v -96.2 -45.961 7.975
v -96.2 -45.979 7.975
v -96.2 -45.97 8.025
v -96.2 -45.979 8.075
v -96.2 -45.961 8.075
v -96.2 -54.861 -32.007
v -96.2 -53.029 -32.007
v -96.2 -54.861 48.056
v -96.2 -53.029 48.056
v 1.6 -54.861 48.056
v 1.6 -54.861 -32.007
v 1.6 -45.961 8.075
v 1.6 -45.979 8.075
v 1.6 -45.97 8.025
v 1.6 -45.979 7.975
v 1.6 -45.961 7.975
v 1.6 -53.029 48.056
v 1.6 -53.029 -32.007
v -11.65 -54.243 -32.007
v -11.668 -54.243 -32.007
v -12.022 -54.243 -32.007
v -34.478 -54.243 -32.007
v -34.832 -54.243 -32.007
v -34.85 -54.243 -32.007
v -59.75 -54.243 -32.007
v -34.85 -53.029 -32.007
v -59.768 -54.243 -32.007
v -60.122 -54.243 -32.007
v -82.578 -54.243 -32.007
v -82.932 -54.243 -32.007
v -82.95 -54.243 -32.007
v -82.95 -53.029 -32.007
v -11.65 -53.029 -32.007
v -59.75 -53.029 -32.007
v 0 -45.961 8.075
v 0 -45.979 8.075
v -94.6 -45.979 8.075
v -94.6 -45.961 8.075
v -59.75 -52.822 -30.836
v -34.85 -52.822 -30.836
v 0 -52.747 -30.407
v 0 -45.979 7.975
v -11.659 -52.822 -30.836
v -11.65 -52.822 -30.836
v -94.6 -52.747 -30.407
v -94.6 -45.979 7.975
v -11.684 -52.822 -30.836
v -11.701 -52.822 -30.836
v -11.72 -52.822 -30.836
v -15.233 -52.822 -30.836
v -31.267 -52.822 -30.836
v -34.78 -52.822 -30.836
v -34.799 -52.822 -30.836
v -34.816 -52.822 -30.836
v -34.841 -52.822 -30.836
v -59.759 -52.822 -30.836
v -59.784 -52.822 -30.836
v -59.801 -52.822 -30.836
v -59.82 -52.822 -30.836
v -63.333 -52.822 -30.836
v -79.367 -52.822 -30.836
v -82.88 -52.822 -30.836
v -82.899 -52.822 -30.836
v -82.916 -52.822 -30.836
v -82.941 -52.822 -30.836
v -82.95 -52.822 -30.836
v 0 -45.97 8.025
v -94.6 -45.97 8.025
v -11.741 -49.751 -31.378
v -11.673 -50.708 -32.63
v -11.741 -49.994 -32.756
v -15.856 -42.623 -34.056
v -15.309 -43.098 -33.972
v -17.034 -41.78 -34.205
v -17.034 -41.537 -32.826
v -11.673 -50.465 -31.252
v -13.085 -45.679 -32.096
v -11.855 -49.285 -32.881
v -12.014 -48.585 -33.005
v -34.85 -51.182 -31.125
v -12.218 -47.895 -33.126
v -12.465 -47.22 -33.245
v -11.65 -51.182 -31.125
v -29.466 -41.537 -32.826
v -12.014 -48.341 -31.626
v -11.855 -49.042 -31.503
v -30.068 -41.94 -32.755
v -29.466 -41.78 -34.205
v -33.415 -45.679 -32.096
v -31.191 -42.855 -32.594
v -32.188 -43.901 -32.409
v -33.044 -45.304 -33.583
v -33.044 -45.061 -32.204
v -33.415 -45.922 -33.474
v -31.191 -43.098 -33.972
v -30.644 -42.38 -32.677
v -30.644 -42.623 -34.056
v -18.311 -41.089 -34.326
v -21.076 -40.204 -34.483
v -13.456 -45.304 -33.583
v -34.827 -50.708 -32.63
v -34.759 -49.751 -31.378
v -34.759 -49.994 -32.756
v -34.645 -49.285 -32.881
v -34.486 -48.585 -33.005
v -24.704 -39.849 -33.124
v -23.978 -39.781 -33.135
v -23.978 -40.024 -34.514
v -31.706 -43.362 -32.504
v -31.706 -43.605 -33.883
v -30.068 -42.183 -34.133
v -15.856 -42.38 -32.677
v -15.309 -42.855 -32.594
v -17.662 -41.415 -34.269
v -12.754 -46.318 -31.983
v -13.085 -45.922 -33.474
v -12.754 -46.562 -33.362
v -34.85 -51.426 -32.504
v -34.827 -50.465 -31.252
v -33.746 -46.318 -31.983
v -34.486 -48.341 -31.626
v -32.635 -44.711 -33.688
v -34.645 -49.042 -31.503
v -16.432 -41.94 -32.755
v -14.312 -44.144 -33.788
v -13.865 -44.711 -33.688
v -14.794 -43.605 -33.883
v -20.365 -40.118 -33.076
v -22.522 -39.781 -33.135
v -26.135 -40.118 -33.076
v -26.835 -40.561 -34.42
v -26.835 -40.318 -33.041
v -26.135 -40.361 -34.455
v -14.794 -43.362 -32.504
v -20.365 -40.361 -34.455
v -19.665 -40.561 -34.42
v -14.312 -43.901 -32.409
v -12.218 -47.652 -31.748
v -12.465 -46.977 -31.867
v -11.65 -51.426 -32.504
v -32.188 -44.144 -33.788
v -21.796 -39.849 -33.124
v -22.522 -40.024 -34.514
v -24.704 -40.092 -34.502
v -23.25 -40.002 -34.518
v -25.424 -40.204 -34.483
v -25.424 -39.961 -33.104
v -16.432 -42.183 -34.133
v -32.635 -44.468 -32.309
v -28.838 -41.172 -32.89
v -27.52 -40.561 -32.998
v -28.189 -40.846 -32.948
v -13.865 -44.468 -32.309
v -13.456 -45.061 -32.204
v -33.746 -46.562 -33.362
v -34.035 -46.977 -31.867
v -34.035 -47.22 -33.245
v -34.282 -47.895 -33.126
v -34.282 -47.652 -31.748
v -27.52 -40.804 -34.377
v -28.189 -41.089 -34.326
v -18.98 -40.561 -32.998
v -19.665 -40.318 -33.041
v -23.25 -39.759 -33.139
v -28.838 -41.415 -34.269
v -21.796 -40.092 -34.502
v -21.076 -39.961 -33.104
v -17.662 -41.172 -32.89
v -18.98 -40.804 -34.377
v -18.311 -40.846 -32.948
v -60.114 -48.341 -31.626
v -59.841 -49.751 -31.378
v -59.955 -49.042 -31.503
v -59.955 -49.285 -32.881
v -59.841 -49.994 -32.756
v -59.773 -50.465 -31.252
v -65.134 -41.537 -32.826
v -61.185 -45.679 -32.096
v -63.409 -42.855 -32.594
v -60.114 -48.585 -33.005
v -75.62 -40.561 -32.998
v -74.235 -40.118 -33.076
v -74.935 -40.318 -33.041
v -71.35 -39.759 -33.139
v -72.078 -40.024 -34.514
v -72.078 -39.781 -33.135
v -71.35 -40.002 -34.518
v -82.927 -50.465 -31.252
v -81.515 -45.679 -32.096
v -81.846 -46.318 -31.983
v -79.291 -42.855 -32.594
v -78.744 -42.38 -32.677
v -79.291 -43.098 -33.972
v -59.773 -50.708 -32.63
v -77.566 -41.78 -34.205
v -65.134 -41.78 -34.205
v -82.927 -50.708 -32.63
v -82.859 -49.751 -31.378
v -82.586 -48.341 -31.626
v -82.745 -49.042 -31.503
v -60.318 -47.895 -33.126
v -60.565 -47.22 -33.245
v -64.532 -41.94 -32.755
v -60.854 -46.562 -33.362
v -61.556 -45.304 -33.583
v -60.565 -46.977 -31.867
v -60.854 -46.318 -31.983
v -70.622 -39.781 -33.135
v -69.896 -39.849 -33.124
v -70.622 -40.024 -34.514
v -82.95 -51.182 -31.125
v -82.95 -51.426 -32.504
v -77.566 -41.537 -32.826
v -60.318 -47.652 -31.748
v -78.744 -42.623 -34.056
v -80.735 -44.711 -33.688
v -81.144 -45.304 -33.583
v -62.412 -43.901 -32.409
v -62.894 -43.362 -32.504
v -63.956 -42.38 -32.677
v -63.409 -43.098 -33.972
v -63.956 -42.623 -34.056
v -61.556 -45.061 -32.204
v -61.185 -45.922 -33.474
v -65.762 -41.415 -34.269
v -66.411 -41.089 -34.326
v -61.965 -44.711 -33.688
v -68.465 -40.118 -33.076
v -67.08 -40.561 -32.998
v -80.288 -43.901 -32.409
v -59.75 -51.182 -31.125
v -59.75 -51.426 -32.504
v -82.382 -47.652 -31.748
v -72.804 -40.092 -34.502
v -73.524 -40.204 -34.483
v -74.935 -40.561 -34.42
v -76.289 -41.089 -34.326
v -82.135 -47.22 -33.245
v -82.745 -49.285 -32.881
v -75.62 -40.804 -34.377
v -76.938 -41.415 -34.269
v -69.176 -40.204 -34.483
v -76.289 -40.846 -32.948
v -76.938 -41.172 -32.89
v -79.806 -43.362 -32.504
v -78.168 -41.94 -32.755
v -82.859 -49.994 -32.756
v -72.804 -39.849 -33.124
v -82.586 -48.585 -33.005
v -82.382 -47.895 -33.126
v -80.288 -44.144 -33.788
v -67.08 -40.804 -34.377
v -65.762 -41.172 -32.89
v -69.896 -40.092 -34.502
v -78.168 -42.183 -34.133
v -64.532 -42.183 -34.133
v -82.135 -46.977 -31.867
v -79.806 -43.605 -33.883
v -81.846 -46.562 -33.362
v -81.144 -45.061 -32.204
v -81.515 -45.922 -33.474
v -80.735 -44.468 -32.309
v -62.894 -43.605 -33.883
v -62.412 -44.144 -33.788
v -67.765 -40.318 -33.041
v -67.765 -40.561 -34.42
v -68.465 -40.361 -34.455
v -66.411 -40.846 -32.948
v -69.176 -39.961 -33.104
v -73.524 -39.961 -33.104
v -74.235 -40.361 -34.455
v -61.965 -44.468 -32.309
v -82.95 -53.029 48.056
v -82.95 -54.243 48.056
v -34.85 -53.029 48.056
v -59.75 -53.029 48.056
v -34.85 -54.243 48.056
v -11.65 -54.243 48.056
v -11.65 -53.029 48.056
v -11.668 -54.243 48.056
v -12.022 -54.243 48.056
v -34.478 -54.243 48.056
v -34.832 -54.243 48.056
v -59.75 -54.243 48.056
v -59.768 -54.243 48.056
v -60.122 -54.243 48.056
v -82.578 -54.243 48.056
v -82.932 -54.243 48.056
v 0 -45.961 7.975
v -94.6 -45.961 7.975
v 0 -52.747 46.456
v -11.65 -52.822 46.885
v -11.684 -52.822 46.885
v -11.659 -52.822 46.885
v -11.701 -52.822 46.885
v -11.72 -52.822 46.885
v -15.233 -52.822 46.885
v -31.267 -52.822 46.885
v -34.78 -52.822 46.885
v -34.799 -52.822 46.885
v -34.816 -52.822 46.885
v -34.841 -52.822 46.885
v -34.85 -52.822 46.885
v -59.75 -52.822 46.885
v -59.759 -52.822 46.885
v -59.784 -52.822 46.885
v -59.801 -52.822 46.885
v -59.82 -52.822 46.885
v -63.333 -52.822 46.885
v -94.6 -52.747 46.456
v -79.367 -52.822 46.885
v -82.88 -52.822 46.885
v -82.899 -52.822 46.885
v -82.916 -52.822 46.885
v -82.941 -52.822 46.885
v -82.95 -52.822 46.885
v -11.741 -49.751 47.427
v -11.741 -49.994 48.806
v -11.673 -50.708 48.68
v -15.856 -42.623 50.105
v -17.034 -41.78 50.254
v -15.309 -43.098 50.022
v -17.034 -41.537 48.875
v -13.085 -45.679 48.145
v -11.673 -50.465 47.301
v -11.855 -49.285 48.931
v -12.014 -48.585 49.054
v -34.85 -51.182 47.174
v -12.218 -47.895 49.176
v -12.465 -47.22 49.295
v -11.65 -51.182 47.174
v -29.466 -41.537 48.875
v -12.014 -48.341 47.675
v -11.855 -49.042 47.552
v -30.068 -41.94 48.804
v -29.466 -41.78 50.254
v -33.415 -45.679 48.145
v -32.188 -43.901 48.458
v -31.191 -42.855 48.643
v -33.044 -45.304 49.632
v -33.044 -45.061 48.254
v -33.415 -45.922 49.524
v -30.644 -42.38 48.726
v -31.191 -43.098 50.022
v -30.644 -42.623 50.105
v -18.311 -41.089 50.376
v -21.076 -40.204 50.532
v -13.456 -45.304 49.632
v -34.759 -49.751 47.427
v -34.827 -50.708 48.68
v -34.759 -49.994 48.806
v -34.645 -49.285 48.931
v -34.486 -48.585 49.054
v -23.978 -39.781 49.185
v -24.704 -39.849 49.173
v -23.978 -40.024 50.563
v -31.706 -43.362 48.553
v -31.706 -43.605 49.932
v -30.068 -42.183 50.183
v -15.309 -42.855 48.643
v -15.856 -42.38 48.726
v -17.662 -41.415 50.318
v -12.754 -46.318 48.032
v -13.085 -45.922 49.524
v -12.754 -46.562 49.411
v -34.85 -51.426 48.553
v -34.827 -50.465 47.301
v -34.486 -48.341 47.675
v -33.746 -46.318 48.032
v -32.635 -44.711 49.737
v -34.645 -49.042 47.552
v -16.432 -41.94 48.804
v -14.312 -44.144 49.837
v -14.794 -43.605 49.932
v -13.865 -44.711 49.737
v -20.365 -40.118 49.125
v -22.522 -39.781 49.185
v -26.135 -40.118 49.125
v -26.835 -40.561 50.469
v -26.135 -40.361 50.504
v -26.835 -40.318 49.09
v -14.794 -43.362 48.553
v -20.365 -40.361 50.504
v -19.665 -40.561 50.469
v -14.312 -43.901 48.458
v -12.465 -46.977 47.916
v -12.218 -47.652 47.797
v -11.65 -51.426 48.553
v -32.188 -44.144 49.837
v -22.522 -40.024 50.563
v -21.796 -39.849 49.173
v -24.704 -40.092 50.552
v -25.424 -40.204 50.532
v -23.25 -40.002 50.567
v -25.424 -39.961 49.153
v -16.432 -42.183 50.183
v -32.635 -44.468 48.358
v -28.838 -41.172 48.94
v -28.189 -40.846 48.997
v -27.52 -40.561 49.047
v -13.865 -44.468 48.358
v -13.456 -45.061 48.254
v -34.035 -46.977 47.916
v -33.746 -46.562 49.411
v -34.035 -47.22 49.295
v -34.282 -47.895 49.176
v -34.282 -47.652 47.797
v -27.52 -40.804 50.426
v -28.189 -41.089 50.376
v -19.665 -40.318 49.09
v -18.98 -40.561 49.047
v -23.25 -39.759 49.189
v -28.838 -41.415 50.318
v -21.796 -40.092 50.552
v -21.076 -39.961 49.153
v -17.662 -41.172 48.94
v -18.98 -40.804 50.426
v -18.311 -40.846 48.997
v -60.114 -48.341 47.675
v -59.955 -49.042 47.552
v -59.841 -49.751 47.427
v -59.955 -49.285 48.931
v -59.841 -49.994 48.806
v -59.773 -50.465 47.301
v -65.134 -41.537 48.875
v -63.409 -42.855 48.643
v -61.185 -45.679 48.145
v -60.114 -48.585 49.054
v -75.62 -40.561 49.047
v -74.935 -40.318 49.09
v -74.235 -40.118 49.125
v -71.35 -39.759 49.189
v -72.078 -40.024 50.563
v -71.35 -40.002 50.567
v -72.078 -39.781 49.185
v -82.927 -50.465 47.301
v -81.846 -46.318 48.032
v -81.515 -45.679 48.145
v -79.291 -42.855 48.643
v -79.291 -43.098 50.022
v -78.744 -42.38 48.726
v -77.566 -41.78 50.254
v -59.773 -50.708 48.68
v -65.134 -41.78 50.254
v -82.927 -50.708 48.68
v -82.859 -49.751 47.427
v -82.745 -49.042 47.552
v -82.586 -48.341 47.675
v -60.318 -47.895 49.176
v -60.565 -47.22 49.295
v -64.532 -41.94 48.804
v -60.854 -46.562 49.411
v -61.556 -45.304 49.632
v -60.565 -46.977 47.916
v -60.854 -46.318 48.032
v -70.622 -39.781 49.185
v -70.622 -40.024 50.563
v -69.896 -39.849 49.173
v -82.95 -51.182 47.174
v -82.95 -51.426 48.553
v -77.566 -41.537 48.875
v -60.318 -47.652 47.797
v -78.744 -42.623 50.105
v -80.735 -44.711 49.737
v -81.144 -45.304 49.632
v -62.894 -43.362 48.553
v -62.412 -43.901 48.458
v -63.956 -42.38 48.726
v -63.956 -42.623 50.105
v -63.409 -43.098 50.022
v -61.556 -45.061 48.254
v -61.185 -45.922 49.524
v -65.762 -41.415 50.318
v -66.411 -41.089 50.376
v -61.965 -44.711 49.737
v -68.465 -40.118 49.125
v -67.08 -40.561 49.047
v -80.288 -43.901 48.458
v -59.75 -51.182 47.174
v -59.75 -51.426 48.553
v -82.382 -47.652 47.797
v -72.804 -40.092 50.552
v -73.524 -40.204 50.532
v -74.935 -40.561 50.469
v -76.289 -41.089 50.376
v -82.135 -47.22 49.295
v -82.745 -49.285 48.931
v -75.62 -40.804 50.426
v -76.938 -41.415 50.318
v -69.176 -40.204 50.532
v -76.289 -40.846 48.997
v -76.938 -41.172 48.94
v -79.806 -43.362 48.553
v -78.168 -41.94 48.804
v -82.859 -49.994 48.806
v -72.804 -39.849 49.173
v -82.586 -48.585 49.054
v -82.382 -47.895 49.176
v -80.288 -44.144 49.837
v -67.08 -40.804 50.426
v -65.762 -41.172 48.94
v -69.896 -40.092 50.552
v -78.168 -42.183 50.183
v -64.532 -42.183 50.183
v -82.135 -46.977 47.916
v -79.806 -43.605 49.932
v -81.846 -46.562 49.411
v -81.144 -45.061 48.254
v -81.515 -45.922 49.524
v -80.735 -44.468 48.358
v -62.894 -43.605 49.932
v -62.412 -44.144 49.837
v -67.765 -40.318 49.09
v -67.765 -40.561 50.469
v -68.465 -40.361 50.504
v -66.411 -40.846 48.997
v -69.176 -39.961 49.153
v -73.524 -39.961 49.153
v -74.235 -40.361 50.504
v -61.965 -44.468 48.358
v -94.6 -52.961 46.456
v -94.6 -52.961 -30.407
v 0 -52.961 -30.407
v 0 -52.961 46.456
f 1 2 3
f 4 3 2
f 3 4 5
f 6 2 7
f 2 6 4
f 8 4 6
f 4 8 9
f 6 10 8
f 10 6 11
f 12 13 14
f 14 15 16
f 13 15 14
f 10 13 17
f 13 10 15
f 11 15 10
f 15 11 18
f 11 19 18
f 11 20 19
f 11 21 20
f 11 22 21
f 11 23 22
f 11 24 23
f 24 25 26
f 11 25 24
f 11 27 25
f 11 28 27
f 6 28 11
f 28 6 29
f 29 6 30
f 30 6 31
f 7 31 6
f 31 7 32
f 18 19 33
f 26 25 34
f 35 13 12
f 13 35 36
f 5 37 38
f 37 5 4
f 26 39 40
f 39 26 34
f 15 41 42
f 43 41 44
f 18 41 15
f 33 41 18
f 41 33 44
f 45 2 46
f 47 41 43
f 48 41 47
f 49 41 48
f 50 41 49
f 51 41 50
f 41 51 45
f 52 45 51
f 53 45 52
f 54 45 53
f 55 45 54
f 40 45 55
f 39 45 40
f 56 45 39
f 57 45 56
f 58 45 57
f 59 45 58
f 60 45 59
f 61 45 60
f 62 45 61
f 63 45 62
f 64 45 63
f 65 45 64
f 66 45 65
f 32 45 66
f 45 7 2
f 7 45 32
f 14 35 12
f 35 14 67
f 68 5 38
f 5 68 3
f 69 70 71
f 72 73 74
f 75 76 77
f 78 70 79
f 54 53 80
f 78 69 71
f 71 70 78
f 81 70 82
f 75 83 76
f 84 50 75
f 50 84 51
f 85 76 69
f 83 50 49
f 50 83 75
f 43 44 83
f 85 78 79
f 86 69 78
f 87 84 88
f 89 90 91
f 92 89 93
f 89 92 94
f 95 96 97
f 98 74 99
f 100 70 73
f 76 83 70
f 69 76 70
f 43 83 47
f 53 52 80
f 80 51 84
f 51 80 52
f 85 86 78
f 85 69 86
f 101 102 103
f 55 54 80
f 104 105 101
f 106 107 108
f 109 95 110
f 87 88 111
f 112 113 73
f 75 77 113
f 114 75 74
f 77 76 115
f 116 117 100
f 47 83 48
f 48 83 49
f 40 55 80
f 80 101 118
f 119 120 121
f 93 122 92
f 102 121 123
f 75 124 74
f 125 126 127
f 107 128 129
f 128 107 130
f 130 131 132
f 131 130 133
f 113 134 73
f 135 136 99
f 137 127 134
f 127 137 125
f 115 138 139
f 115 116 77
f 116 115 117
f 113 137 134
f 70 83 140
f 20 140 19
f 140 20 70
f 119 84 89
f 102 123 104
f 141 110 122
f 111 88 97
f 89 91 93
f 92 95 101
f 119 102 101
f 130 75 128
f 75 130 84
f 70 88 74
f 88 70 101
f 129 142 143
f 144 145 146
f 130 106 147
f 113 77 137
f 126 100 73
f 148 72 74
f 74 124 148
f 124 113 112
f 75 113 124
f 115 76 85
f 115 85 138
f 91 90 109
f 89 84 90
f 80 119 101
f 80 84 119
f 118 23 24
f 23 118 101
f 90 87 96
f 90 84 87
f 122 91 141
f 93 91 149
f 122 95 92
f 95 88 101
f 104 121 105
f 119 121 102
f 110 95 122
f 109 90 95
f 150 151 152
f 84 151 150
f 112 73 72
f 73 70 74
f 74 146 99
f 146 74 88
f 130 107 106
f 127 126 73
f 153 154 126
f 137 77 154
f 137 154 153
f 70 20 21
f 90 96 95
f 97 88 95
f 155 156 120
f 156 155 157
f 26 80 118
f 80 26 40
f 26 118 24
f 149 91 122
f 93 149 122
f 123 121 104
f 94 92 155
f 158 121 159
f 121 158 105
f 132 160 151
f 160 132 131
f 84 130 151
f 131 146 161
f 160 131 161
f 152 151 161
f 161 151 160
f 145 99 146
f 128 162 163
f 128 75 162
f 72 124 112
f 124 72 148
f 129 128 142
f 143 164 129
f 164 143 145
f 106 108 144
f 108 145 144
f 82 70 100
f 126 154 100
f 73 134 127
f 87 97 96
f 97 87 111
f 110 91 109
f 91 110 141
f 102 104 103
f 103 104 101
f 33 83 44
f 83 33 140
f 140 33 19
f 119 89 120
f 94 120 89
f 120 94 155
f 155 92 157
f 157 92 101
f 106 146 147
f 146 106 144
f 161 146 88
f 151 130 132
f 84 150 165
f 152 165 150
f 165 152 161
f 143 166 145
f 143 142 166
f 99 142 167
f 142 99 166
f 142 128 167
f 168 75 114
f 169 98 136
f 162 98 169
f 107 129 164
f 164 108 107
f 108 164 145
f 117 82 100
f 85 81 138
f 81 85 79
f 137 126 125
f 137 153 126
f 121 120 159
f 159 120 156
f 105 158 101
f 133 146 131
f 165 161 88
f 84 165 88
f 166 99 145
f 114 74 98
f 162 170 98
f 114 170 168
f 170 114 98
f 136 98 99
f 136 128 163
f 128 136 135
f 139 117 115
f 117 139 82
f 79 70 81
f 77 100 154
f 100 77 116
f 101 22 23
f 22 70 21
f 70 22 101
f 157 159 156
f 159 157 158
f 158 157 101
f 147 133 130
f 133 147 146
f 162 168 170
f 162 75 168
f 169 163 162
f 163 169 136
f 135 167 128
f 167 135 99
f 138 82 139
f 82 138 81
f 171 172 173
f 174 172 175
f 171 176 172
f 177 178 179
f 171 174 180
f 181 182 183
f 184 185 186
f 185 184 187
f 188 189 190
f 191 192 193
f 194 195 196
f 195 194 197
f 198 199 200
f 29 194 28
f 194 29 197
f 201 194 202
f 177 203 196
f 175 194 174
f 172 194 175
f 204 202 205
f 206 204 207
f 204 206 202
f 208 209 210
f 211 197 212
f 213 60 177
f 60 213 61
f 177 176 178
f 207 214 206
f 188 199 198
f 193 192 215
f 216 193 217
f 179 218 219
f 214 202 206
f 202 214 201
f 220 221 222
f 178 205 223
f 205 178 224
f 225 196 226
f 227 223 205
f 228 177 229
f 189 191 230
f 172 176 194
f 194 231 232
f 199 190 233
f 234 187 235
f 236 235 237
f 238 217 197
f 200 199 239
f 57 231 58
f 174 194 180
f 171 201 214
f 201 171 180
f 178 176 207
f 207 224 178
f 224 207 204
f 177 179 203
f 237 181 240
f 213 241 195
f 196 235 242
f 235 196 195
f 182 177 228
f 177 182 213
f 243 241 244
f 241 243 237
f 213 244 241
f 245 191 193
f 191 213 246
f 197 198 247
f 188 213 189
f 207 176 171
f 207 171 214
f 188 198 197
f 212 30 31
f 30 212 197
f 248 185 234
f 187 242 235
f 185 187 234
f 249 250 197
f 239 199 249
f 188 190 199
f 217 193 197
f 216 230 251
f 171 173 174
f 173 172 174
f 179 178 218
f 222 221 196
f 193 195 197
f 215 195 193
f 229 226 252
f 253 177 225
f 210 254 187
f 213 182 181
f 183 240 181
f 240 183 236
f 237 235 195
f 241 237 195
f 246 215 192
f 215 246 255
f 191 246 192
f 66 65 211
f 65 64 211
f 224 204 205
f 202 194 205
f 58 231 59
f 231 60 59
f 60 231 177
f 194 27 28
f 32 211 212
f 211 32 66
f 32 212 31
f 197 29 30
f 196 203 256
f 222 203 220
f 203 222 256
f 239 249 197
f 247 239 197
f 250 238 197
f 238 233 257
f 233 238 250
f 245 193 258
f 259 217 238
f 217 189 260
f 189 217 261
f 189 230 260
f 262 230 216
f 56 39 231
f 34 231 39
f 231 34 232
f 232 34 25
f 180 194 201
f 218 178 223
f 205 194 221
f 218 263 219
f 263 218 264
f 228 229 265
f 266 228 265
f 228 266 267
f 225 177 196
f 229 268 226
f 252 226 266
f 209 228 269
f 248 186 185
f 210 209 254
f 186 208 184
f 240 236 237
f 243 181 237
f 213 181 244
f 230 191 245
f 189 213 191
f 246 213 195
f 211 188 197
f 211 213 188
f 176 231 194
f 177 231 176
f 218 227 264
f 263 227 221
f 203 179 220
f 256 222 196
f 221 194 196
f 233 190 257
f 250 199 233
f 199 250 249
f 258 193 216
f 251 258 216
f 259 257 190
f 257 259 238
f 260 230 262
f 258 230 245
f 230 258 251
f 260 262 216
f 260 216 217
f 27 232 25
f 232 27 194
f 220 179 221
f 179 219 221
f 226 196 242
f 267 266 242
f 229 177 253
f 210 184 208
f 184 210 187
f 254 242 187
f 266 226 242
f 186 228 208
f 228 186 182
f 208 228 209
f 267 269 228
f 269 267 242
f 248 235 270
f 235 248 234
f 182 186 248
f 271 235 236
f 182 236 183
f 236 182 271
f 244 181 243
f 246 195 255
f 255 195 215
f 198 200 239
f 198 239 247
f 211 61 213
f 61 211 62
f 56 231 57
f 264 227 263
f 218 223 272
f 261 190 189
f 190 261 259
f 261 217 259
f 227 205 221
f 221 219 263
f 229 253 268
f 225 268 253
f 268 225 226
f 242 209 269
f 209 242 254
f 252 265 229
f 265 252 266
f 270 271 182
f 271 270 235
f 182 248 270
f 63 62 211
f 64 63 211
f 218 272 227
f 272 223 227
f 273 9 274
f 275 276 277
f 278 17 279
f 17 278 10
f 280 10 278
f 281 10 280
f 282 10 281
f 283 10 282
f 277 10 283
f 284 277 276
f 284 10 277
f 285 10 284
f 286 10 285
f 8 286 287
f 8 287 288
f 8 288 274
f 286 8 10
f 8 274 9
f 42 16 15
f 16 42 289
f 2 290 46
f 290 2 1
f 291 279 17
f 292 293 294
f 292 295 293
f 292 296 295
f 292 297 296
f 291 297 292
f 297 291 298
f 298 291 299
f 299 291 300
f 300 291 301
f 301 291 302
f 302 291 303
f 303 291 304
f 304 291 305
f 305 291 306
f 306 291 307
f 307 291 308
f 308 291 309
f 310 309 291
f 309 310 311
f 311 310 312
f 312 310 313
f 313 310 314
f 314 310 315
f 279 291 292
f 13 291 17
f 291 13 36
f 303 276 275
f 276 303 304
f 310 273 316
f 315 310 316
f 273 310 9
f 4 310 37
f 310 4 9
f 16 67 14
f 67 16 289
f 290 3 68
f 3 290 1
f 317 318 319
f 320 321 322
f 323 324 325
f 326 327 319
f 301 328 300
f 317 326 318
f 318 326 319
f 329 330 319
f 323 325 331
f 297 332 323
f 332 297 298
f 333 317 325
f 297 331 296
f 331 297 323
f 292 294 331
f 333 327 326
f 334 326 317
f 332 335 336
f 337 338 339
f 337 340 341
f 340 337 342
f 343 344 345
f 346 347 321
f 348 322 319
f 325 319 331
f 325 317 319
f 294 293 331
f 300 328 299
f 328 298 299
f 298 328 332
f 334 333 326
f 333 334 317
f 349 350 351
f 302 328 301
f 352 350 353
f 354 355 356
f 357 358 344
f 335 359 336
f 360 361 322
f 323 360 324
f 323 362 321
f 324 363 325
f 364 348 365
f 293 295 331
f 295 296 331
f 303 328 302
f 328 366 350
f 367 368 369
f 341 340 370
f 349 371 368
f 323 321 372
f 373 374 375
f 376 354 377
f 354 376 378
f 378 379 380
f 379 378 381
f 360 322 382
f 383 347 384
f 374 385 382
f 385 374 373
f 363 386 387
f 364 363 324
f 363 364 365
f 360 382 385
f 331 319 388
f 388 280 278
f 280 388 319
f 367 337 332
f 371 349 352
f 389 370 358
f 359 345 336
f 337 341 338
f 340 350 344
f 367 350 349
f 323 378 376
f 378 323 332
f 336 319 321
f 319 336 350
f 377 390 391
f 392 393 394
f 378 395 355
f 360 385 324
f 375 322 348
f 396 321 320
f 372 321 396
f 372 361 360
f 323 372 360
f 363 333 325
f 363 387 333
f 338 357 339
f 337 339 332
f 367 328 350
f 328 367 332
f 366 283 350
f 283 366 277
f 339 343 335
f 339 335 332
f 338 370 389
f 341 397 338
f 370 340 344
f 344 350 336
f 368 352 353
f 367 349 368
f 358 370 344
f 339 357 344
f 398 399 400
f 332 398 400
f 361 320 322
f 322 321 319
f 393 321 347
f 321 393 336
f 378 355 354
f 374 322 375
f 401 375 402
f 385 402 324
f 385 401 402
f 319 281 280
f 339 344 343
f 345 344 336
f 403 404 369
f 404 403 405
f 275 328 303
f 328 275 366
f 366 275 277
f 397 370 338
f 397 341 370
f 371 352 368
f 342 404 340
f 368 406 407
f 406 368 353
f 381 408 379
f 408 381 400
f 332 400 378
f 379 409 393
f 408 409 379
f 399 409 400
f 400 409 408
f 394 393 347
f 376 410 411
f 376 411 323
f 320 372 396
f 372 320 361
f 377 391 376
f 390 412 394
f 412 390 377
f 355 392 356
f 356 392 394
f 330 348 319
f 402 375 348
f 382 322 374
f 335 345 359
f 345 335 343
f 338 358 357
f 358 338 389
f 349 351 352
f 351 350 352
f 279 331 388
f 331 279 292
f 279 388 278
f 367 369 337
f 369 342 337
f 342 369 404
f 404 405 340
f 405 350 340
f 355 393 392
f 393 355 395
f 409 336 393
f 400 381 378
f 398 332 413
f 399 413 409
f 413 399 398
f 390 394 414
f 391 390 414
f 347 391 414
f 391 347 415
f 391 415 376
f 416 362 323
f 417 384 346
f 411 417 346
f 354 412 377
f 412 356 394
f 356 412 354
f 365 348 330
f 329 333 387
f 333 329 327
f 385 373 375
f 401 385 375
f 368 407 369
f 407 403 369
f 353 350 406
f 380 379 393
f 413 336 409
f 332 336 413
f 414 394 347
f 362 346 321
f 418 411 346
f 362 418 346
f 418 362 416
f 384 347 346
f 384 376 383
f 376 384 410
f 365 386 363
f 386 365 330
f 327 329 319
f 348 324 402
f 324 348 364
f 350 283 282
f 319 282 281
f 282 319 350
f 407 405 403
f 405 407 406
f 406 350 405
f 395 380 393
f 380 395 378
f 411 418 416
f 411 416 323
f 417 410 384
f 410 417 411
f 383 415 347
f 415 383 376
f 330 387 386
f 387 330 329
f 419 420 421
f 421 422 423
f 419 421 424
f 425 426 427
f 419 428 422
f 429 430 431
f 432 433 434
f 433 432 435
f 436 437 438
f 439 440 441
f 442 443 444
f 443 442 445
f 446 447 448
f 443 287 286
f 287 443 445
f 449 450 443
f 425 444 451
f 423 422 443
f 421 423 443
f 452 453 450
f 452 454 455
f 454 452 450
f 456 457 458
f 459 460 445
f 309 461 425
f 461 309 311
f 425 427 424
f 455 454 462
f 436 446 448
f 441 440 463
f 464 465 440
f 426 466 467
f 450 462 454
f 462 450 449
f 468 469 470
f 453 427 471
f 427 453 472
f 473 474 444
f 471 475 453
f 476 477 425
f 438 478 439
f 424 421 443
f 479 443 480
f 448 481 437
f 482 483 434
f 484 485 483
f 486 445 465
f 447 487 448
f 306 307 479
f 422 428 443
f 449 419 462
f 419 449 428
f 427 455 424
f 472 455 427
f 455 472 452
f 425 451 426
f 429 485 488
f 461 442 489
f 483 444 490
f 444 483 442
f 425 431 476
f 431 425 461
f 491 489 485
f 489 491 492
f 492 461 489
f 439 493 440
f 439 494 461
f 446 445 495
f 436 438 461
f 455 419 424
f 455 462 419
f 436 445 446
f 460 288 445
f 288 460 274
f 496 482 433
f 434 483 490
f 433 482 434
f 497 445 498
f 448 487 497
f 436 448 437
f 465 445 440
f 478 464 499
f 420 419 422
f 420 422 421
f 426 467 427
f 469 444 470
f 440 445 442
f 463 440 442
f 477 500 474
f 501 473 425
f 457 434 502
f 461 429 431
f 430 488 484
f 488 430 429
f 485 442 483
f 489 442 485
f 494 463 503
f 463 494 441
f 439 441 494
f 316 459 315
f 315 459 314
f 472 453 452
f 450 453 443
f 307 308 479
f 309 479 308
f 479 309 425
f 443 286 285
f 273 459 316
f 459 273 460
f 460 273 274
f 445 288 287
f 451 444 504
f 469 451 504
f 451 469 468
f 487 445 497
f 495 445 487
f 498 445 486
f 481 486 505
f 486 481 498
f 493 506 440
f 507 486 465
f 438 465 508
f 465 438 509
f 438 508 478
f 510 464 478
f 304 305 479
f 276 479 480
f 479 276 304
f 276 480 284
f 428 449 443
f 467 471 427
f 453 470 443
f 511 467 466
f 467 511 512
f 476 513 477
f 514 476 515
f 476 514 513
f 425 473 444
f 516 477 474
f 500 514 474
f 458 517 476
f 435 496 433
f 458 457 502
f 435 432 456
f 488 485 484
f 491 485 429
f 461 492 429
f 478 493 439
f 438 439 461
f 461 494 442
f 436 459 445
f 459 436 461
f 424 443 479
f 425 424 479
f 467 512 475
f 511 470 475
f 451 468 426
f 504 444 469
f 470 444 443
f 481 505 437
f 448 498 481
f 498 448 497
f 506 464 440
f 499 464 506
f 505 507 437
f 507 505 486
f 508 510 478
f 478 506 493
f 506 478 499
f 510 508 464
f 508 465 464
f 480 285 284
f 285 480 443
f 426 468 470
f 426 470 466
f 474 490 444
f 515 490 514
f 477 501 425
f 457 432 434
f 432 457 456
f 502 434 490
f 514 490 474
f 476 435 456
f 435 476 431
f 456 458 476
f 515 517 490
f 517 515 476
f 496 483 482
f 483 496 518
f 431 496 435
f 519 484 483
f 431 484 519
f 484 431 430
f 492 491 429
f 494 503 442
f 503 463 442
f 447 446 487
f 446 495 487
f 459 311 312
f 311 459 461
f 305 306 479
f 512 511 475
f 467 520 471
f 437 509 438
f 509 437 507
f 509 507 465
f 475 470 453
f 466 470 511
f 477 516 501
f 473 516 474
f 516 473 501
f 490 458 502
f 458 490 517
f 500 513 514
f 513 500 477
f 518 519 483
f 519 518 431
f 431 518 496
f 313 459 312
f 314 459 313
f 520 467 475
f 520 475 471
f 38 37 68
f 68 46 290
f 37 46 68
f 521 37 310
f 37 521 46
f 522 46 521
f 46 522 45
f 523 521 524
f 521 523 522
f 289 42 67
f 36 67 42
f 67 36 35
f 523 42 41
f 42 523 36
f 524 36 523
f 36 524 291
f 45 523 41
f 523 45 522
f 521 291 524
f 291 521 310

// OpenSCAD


// Token width
tokenwidth = 45;
// Token height
tokenheight= 45;
// Token stack depth
tokenstack = 36;
// Number of stacks to create
numstack = 2;
// Create a mirrored line of stacks
doublerev = "yes"; // [yes:yes,no:no]
// Rotation of the stacks
rotation = 10; // [0,1,2,3,4,5,6,7,8,9,10,11,12,13,14,15,16,17,18,19,20,21,22,23,24,25,26,27,28,29,30,31,32,33,34,35,36,37,38,39,40]
// Wall size
wallsize = 1.6;
// Wobble (added to width, height and depth)
wobble = 1.5;
// Size of the holes cutout
fingersize = 24;
// Text you want to add
text = "";
// The font you want to use
font = "Slabo 27px"; // [Slabo 27px,Oswald,Indie Flower,Yanone Kaffeesatz,Titillium Web,Arvo,Lobster,Fjalla One,Bree Serif,Muli,Pacifico,Anton,Maven Pro,Monda,Lobster Two,Bangers,Sigmar One,Courgette,Fugaz One,Patrick Hand,Viga,Fredoka One,Damion,Audiowide,Black Ops One,Montserrat Alternates,Jockey One,Lily Script One]
// Size of the text
textsize = 18;
// Print the box or lid
print = "lid"; // [box:Box,lid:Lid]


$fn = 100;

basex = (tokenwidth+wobble)*numstack+wallsize*numstack+wallsize;
basey = cos(rotation)*(tokenstack+wobble+wallsize*2)+cos(rotation-90)*(tokenheight+wobble);
topy = cos(rotation)*(tokenstack+wobble+wallsize*2);
    
module inline(){
    difference(){
        union(){
             translate([-wallsize,-sin(rotation)*(tokenheight+wobble),-2]) cube([basex, basey, sin(rotation)*(tokenstack+wobble+wallsize*2)+2]);
            translate([-wallsize,0,0]) rotate([rotation,0,0]) cube([basex, tokenstack+wobble+wallsize*2, tokenheight+wobble]);
            translate([-wallsize,-sin(rotation)*(tokenheight+wobble),0]) cube([basex, tokenstack+wobble+wallsize*2, cos(rotation)*(tokenheight+wobble)]);
        }
        for(i = [0:numstack-1]) {
            translate([i*(wallsize+tokenwidth+wobble),wallsize,0]) rotate([rotation,0,0]) cube([tokenwidth+wobble, tokenstack+wobble, tokenheight+wobble+2]);
            hull(){
                rotate([90+rotation,0,0]) translate([(tokenwidth+wobble)/2+(i*(tokenwidth+wobble+wallsize)),tokenheight/2,-tokenstack-wobble-(2.15*wallsize)]) cylinder(d=fingersize,h=wallsize*2);
                rotate([90+rotation,0,0]) translate([(tokenwidth+wobble)/2+(i*(tokenwidth+wobble+wallsize)),tokenheight+wobble,-tokenstack-wobble-(2.15*wallsize)]) cylinder(d=fingersize,h=wallsize*2);
            }
        }
    }
}

module cover(){
    difference(){
        union(){
             //translate([-wallsize,-sin(rotation)*(tokenheight+wobble),-2]) cube([basex, basey, sin(rotation)*(tokenstack+wobble+wallsize*2)+2]);
           difference(){
               translate([-wallsize,-sin(rotation)*(tokenheight+wobble),cos(rotation)*(tokenheight+wobble)]) cube([basex, topy, sin(rotation)*(tokenstack+wobble+wallsize*2)+2]);
            translate([-wallsize-0.1,-0.1,wobble/10]) rotate([rotation,0,0]) cube([basex+0.2, tokenstack+wobble+wallsize*2+0.2, tokenheight+wobble]);
           }
            //translate([-wallsize,-sin(rotation)*(tokenheight+wobble),0]) cube([basex, tokenstack+wobble+wallsize*2, cos(rotation)*(tokenheight+wobble)]);
           
        for(i = [0:numstack-1]) {
            //translate([i*(wallsize+tokenwidth+wobble),wallsize,0]) rotate([rotation,0,0]) cube([tokenwidth+wobble, tokenstack+wobble, tokenheight+wobble+2]);
            difference(){
            hull(){
                rotate([90+rotation,0,0]) translate([(tokenwidth+wobble)/2+(i*(tokenwidth+wobble+wallsize)),tokenheight,-tokenstack-wobble-(2.15*wallsize)]) cylinder(d=fingersize-0.8,h=wallsize-0.2);
                rotate([90+rotation,0,0]) translate([(tokenwidth+wobble)/2+(i*(tokenwidth+wobble+wallsize)),tokenheight+wobble*10,-tokenstack-wobble-(2.15*wallsize)]) cylinder(d=fingersize-0.8,h=wallsize-0.2);
            }
           translate([-wallsize,-sin(rotation)*(tokenheight+wobble),cos(rotation)*(tokenheight+wobble)+sin(rotation)*(tokenstack+wobble+wallsize*2)+2]) cube([basex, topy*1.1, tokenheight+wobble]);
        }
        }
        }

    }
}

if(print == "box"){
if(doublerev == "yes") {
    union(){
        translate([0,0,0]) inline();
    rotate([0,0,90]) translate([-sin(rotation)*(tokenheight+wobble)*2+0.1,0,0]) mirror([1,1,0]){ inline(); };
}
    echo(str("Dimensions are : ", basex, " mm * ", basey*2, "mm"));
} else {
    translate([0,0,0]) inline();
    echo(str("Dimensions are : ", basex, " mm * ", basey, "mm"));
}
}

if(print == "lid"){
if(doublerev == "yes") {
    rotate([-90,0,180]) difference(){
    union(){
        translate([0,0,0]) cover();
    rotate([0,0,90]) translate([-sin(rotation)*(tokenheight+wobble)*2+0.1,0,0]) mirror([1,1,0]){ cover(); };
}
translate([basex/2-wallsize,-sin(rotation)*(tokenheight+wobble),cos(rotation)*(tokenheight+wobble)+sin(rotation)*(tokenstack+wobble+wallsize*2)+1.1]) rotate([0,0,180]) linear_extrude(height = 50, center = false, convexity = 10) text(text,size=textsize,font=font,valign="center",halign="center");
translate([0,-sin(rotation)*(tokenheight+wobble),cos(rotation)*(tokenheight+wobble)-wallsize]) cube([basex-wallsize*2, topy-wallsize, sin(rotation)*(tokenstack+wobble+wallsize*2)+1.7]);

rotate([0,0,90]) translate([-sin(rotation)*(tokenheight+wobble)*2+0.1,0,0]) mirror([1,1,0]) translate([0,-sin(rotation)*(tokenheight+wobble),cos(rotation)*(tokenheight+wobble)-wallsize]) cube([basex-wallsize*2, topy-wallsize, sin(rotation)*(tokenstack+wobble+wallsize*2)+1.7]);
}
    //echo(str("Dimensions are : ", basex, " mm * ", basey*2, "mm"));
} else {
    rotate([-90,0,180]) difference(){
    translate([0,0,0]) cover();
        translate([basex/2-wallsize,-sin(rotation)*(tokenheight+wobble)+topy/2,cos(rotation)*(tokenheight+wobble)+sin(rotation)*(tokenstack+wobble+wallsize*2)+1.1]) rotate([0,0,180]) linear_extrude(height = 50, center = false, convexity = 10) text(text,size=textsize,font=font,valign="center",halign="center");
        translate([0,-sin(rotation)*(tokenheight+wobble)+wallsize,cos(rotation)*(tokenheight+wobble)-wallsize]) cube([basex-wallsize*2, topy-wallsize*2, sin(rotation)*(tokenstack+wobble+wallsize*2)+1.7]);
    }
    //echo(str("Dimensions are : ", basex, " mm * ", basey, "mm"));
}
}




